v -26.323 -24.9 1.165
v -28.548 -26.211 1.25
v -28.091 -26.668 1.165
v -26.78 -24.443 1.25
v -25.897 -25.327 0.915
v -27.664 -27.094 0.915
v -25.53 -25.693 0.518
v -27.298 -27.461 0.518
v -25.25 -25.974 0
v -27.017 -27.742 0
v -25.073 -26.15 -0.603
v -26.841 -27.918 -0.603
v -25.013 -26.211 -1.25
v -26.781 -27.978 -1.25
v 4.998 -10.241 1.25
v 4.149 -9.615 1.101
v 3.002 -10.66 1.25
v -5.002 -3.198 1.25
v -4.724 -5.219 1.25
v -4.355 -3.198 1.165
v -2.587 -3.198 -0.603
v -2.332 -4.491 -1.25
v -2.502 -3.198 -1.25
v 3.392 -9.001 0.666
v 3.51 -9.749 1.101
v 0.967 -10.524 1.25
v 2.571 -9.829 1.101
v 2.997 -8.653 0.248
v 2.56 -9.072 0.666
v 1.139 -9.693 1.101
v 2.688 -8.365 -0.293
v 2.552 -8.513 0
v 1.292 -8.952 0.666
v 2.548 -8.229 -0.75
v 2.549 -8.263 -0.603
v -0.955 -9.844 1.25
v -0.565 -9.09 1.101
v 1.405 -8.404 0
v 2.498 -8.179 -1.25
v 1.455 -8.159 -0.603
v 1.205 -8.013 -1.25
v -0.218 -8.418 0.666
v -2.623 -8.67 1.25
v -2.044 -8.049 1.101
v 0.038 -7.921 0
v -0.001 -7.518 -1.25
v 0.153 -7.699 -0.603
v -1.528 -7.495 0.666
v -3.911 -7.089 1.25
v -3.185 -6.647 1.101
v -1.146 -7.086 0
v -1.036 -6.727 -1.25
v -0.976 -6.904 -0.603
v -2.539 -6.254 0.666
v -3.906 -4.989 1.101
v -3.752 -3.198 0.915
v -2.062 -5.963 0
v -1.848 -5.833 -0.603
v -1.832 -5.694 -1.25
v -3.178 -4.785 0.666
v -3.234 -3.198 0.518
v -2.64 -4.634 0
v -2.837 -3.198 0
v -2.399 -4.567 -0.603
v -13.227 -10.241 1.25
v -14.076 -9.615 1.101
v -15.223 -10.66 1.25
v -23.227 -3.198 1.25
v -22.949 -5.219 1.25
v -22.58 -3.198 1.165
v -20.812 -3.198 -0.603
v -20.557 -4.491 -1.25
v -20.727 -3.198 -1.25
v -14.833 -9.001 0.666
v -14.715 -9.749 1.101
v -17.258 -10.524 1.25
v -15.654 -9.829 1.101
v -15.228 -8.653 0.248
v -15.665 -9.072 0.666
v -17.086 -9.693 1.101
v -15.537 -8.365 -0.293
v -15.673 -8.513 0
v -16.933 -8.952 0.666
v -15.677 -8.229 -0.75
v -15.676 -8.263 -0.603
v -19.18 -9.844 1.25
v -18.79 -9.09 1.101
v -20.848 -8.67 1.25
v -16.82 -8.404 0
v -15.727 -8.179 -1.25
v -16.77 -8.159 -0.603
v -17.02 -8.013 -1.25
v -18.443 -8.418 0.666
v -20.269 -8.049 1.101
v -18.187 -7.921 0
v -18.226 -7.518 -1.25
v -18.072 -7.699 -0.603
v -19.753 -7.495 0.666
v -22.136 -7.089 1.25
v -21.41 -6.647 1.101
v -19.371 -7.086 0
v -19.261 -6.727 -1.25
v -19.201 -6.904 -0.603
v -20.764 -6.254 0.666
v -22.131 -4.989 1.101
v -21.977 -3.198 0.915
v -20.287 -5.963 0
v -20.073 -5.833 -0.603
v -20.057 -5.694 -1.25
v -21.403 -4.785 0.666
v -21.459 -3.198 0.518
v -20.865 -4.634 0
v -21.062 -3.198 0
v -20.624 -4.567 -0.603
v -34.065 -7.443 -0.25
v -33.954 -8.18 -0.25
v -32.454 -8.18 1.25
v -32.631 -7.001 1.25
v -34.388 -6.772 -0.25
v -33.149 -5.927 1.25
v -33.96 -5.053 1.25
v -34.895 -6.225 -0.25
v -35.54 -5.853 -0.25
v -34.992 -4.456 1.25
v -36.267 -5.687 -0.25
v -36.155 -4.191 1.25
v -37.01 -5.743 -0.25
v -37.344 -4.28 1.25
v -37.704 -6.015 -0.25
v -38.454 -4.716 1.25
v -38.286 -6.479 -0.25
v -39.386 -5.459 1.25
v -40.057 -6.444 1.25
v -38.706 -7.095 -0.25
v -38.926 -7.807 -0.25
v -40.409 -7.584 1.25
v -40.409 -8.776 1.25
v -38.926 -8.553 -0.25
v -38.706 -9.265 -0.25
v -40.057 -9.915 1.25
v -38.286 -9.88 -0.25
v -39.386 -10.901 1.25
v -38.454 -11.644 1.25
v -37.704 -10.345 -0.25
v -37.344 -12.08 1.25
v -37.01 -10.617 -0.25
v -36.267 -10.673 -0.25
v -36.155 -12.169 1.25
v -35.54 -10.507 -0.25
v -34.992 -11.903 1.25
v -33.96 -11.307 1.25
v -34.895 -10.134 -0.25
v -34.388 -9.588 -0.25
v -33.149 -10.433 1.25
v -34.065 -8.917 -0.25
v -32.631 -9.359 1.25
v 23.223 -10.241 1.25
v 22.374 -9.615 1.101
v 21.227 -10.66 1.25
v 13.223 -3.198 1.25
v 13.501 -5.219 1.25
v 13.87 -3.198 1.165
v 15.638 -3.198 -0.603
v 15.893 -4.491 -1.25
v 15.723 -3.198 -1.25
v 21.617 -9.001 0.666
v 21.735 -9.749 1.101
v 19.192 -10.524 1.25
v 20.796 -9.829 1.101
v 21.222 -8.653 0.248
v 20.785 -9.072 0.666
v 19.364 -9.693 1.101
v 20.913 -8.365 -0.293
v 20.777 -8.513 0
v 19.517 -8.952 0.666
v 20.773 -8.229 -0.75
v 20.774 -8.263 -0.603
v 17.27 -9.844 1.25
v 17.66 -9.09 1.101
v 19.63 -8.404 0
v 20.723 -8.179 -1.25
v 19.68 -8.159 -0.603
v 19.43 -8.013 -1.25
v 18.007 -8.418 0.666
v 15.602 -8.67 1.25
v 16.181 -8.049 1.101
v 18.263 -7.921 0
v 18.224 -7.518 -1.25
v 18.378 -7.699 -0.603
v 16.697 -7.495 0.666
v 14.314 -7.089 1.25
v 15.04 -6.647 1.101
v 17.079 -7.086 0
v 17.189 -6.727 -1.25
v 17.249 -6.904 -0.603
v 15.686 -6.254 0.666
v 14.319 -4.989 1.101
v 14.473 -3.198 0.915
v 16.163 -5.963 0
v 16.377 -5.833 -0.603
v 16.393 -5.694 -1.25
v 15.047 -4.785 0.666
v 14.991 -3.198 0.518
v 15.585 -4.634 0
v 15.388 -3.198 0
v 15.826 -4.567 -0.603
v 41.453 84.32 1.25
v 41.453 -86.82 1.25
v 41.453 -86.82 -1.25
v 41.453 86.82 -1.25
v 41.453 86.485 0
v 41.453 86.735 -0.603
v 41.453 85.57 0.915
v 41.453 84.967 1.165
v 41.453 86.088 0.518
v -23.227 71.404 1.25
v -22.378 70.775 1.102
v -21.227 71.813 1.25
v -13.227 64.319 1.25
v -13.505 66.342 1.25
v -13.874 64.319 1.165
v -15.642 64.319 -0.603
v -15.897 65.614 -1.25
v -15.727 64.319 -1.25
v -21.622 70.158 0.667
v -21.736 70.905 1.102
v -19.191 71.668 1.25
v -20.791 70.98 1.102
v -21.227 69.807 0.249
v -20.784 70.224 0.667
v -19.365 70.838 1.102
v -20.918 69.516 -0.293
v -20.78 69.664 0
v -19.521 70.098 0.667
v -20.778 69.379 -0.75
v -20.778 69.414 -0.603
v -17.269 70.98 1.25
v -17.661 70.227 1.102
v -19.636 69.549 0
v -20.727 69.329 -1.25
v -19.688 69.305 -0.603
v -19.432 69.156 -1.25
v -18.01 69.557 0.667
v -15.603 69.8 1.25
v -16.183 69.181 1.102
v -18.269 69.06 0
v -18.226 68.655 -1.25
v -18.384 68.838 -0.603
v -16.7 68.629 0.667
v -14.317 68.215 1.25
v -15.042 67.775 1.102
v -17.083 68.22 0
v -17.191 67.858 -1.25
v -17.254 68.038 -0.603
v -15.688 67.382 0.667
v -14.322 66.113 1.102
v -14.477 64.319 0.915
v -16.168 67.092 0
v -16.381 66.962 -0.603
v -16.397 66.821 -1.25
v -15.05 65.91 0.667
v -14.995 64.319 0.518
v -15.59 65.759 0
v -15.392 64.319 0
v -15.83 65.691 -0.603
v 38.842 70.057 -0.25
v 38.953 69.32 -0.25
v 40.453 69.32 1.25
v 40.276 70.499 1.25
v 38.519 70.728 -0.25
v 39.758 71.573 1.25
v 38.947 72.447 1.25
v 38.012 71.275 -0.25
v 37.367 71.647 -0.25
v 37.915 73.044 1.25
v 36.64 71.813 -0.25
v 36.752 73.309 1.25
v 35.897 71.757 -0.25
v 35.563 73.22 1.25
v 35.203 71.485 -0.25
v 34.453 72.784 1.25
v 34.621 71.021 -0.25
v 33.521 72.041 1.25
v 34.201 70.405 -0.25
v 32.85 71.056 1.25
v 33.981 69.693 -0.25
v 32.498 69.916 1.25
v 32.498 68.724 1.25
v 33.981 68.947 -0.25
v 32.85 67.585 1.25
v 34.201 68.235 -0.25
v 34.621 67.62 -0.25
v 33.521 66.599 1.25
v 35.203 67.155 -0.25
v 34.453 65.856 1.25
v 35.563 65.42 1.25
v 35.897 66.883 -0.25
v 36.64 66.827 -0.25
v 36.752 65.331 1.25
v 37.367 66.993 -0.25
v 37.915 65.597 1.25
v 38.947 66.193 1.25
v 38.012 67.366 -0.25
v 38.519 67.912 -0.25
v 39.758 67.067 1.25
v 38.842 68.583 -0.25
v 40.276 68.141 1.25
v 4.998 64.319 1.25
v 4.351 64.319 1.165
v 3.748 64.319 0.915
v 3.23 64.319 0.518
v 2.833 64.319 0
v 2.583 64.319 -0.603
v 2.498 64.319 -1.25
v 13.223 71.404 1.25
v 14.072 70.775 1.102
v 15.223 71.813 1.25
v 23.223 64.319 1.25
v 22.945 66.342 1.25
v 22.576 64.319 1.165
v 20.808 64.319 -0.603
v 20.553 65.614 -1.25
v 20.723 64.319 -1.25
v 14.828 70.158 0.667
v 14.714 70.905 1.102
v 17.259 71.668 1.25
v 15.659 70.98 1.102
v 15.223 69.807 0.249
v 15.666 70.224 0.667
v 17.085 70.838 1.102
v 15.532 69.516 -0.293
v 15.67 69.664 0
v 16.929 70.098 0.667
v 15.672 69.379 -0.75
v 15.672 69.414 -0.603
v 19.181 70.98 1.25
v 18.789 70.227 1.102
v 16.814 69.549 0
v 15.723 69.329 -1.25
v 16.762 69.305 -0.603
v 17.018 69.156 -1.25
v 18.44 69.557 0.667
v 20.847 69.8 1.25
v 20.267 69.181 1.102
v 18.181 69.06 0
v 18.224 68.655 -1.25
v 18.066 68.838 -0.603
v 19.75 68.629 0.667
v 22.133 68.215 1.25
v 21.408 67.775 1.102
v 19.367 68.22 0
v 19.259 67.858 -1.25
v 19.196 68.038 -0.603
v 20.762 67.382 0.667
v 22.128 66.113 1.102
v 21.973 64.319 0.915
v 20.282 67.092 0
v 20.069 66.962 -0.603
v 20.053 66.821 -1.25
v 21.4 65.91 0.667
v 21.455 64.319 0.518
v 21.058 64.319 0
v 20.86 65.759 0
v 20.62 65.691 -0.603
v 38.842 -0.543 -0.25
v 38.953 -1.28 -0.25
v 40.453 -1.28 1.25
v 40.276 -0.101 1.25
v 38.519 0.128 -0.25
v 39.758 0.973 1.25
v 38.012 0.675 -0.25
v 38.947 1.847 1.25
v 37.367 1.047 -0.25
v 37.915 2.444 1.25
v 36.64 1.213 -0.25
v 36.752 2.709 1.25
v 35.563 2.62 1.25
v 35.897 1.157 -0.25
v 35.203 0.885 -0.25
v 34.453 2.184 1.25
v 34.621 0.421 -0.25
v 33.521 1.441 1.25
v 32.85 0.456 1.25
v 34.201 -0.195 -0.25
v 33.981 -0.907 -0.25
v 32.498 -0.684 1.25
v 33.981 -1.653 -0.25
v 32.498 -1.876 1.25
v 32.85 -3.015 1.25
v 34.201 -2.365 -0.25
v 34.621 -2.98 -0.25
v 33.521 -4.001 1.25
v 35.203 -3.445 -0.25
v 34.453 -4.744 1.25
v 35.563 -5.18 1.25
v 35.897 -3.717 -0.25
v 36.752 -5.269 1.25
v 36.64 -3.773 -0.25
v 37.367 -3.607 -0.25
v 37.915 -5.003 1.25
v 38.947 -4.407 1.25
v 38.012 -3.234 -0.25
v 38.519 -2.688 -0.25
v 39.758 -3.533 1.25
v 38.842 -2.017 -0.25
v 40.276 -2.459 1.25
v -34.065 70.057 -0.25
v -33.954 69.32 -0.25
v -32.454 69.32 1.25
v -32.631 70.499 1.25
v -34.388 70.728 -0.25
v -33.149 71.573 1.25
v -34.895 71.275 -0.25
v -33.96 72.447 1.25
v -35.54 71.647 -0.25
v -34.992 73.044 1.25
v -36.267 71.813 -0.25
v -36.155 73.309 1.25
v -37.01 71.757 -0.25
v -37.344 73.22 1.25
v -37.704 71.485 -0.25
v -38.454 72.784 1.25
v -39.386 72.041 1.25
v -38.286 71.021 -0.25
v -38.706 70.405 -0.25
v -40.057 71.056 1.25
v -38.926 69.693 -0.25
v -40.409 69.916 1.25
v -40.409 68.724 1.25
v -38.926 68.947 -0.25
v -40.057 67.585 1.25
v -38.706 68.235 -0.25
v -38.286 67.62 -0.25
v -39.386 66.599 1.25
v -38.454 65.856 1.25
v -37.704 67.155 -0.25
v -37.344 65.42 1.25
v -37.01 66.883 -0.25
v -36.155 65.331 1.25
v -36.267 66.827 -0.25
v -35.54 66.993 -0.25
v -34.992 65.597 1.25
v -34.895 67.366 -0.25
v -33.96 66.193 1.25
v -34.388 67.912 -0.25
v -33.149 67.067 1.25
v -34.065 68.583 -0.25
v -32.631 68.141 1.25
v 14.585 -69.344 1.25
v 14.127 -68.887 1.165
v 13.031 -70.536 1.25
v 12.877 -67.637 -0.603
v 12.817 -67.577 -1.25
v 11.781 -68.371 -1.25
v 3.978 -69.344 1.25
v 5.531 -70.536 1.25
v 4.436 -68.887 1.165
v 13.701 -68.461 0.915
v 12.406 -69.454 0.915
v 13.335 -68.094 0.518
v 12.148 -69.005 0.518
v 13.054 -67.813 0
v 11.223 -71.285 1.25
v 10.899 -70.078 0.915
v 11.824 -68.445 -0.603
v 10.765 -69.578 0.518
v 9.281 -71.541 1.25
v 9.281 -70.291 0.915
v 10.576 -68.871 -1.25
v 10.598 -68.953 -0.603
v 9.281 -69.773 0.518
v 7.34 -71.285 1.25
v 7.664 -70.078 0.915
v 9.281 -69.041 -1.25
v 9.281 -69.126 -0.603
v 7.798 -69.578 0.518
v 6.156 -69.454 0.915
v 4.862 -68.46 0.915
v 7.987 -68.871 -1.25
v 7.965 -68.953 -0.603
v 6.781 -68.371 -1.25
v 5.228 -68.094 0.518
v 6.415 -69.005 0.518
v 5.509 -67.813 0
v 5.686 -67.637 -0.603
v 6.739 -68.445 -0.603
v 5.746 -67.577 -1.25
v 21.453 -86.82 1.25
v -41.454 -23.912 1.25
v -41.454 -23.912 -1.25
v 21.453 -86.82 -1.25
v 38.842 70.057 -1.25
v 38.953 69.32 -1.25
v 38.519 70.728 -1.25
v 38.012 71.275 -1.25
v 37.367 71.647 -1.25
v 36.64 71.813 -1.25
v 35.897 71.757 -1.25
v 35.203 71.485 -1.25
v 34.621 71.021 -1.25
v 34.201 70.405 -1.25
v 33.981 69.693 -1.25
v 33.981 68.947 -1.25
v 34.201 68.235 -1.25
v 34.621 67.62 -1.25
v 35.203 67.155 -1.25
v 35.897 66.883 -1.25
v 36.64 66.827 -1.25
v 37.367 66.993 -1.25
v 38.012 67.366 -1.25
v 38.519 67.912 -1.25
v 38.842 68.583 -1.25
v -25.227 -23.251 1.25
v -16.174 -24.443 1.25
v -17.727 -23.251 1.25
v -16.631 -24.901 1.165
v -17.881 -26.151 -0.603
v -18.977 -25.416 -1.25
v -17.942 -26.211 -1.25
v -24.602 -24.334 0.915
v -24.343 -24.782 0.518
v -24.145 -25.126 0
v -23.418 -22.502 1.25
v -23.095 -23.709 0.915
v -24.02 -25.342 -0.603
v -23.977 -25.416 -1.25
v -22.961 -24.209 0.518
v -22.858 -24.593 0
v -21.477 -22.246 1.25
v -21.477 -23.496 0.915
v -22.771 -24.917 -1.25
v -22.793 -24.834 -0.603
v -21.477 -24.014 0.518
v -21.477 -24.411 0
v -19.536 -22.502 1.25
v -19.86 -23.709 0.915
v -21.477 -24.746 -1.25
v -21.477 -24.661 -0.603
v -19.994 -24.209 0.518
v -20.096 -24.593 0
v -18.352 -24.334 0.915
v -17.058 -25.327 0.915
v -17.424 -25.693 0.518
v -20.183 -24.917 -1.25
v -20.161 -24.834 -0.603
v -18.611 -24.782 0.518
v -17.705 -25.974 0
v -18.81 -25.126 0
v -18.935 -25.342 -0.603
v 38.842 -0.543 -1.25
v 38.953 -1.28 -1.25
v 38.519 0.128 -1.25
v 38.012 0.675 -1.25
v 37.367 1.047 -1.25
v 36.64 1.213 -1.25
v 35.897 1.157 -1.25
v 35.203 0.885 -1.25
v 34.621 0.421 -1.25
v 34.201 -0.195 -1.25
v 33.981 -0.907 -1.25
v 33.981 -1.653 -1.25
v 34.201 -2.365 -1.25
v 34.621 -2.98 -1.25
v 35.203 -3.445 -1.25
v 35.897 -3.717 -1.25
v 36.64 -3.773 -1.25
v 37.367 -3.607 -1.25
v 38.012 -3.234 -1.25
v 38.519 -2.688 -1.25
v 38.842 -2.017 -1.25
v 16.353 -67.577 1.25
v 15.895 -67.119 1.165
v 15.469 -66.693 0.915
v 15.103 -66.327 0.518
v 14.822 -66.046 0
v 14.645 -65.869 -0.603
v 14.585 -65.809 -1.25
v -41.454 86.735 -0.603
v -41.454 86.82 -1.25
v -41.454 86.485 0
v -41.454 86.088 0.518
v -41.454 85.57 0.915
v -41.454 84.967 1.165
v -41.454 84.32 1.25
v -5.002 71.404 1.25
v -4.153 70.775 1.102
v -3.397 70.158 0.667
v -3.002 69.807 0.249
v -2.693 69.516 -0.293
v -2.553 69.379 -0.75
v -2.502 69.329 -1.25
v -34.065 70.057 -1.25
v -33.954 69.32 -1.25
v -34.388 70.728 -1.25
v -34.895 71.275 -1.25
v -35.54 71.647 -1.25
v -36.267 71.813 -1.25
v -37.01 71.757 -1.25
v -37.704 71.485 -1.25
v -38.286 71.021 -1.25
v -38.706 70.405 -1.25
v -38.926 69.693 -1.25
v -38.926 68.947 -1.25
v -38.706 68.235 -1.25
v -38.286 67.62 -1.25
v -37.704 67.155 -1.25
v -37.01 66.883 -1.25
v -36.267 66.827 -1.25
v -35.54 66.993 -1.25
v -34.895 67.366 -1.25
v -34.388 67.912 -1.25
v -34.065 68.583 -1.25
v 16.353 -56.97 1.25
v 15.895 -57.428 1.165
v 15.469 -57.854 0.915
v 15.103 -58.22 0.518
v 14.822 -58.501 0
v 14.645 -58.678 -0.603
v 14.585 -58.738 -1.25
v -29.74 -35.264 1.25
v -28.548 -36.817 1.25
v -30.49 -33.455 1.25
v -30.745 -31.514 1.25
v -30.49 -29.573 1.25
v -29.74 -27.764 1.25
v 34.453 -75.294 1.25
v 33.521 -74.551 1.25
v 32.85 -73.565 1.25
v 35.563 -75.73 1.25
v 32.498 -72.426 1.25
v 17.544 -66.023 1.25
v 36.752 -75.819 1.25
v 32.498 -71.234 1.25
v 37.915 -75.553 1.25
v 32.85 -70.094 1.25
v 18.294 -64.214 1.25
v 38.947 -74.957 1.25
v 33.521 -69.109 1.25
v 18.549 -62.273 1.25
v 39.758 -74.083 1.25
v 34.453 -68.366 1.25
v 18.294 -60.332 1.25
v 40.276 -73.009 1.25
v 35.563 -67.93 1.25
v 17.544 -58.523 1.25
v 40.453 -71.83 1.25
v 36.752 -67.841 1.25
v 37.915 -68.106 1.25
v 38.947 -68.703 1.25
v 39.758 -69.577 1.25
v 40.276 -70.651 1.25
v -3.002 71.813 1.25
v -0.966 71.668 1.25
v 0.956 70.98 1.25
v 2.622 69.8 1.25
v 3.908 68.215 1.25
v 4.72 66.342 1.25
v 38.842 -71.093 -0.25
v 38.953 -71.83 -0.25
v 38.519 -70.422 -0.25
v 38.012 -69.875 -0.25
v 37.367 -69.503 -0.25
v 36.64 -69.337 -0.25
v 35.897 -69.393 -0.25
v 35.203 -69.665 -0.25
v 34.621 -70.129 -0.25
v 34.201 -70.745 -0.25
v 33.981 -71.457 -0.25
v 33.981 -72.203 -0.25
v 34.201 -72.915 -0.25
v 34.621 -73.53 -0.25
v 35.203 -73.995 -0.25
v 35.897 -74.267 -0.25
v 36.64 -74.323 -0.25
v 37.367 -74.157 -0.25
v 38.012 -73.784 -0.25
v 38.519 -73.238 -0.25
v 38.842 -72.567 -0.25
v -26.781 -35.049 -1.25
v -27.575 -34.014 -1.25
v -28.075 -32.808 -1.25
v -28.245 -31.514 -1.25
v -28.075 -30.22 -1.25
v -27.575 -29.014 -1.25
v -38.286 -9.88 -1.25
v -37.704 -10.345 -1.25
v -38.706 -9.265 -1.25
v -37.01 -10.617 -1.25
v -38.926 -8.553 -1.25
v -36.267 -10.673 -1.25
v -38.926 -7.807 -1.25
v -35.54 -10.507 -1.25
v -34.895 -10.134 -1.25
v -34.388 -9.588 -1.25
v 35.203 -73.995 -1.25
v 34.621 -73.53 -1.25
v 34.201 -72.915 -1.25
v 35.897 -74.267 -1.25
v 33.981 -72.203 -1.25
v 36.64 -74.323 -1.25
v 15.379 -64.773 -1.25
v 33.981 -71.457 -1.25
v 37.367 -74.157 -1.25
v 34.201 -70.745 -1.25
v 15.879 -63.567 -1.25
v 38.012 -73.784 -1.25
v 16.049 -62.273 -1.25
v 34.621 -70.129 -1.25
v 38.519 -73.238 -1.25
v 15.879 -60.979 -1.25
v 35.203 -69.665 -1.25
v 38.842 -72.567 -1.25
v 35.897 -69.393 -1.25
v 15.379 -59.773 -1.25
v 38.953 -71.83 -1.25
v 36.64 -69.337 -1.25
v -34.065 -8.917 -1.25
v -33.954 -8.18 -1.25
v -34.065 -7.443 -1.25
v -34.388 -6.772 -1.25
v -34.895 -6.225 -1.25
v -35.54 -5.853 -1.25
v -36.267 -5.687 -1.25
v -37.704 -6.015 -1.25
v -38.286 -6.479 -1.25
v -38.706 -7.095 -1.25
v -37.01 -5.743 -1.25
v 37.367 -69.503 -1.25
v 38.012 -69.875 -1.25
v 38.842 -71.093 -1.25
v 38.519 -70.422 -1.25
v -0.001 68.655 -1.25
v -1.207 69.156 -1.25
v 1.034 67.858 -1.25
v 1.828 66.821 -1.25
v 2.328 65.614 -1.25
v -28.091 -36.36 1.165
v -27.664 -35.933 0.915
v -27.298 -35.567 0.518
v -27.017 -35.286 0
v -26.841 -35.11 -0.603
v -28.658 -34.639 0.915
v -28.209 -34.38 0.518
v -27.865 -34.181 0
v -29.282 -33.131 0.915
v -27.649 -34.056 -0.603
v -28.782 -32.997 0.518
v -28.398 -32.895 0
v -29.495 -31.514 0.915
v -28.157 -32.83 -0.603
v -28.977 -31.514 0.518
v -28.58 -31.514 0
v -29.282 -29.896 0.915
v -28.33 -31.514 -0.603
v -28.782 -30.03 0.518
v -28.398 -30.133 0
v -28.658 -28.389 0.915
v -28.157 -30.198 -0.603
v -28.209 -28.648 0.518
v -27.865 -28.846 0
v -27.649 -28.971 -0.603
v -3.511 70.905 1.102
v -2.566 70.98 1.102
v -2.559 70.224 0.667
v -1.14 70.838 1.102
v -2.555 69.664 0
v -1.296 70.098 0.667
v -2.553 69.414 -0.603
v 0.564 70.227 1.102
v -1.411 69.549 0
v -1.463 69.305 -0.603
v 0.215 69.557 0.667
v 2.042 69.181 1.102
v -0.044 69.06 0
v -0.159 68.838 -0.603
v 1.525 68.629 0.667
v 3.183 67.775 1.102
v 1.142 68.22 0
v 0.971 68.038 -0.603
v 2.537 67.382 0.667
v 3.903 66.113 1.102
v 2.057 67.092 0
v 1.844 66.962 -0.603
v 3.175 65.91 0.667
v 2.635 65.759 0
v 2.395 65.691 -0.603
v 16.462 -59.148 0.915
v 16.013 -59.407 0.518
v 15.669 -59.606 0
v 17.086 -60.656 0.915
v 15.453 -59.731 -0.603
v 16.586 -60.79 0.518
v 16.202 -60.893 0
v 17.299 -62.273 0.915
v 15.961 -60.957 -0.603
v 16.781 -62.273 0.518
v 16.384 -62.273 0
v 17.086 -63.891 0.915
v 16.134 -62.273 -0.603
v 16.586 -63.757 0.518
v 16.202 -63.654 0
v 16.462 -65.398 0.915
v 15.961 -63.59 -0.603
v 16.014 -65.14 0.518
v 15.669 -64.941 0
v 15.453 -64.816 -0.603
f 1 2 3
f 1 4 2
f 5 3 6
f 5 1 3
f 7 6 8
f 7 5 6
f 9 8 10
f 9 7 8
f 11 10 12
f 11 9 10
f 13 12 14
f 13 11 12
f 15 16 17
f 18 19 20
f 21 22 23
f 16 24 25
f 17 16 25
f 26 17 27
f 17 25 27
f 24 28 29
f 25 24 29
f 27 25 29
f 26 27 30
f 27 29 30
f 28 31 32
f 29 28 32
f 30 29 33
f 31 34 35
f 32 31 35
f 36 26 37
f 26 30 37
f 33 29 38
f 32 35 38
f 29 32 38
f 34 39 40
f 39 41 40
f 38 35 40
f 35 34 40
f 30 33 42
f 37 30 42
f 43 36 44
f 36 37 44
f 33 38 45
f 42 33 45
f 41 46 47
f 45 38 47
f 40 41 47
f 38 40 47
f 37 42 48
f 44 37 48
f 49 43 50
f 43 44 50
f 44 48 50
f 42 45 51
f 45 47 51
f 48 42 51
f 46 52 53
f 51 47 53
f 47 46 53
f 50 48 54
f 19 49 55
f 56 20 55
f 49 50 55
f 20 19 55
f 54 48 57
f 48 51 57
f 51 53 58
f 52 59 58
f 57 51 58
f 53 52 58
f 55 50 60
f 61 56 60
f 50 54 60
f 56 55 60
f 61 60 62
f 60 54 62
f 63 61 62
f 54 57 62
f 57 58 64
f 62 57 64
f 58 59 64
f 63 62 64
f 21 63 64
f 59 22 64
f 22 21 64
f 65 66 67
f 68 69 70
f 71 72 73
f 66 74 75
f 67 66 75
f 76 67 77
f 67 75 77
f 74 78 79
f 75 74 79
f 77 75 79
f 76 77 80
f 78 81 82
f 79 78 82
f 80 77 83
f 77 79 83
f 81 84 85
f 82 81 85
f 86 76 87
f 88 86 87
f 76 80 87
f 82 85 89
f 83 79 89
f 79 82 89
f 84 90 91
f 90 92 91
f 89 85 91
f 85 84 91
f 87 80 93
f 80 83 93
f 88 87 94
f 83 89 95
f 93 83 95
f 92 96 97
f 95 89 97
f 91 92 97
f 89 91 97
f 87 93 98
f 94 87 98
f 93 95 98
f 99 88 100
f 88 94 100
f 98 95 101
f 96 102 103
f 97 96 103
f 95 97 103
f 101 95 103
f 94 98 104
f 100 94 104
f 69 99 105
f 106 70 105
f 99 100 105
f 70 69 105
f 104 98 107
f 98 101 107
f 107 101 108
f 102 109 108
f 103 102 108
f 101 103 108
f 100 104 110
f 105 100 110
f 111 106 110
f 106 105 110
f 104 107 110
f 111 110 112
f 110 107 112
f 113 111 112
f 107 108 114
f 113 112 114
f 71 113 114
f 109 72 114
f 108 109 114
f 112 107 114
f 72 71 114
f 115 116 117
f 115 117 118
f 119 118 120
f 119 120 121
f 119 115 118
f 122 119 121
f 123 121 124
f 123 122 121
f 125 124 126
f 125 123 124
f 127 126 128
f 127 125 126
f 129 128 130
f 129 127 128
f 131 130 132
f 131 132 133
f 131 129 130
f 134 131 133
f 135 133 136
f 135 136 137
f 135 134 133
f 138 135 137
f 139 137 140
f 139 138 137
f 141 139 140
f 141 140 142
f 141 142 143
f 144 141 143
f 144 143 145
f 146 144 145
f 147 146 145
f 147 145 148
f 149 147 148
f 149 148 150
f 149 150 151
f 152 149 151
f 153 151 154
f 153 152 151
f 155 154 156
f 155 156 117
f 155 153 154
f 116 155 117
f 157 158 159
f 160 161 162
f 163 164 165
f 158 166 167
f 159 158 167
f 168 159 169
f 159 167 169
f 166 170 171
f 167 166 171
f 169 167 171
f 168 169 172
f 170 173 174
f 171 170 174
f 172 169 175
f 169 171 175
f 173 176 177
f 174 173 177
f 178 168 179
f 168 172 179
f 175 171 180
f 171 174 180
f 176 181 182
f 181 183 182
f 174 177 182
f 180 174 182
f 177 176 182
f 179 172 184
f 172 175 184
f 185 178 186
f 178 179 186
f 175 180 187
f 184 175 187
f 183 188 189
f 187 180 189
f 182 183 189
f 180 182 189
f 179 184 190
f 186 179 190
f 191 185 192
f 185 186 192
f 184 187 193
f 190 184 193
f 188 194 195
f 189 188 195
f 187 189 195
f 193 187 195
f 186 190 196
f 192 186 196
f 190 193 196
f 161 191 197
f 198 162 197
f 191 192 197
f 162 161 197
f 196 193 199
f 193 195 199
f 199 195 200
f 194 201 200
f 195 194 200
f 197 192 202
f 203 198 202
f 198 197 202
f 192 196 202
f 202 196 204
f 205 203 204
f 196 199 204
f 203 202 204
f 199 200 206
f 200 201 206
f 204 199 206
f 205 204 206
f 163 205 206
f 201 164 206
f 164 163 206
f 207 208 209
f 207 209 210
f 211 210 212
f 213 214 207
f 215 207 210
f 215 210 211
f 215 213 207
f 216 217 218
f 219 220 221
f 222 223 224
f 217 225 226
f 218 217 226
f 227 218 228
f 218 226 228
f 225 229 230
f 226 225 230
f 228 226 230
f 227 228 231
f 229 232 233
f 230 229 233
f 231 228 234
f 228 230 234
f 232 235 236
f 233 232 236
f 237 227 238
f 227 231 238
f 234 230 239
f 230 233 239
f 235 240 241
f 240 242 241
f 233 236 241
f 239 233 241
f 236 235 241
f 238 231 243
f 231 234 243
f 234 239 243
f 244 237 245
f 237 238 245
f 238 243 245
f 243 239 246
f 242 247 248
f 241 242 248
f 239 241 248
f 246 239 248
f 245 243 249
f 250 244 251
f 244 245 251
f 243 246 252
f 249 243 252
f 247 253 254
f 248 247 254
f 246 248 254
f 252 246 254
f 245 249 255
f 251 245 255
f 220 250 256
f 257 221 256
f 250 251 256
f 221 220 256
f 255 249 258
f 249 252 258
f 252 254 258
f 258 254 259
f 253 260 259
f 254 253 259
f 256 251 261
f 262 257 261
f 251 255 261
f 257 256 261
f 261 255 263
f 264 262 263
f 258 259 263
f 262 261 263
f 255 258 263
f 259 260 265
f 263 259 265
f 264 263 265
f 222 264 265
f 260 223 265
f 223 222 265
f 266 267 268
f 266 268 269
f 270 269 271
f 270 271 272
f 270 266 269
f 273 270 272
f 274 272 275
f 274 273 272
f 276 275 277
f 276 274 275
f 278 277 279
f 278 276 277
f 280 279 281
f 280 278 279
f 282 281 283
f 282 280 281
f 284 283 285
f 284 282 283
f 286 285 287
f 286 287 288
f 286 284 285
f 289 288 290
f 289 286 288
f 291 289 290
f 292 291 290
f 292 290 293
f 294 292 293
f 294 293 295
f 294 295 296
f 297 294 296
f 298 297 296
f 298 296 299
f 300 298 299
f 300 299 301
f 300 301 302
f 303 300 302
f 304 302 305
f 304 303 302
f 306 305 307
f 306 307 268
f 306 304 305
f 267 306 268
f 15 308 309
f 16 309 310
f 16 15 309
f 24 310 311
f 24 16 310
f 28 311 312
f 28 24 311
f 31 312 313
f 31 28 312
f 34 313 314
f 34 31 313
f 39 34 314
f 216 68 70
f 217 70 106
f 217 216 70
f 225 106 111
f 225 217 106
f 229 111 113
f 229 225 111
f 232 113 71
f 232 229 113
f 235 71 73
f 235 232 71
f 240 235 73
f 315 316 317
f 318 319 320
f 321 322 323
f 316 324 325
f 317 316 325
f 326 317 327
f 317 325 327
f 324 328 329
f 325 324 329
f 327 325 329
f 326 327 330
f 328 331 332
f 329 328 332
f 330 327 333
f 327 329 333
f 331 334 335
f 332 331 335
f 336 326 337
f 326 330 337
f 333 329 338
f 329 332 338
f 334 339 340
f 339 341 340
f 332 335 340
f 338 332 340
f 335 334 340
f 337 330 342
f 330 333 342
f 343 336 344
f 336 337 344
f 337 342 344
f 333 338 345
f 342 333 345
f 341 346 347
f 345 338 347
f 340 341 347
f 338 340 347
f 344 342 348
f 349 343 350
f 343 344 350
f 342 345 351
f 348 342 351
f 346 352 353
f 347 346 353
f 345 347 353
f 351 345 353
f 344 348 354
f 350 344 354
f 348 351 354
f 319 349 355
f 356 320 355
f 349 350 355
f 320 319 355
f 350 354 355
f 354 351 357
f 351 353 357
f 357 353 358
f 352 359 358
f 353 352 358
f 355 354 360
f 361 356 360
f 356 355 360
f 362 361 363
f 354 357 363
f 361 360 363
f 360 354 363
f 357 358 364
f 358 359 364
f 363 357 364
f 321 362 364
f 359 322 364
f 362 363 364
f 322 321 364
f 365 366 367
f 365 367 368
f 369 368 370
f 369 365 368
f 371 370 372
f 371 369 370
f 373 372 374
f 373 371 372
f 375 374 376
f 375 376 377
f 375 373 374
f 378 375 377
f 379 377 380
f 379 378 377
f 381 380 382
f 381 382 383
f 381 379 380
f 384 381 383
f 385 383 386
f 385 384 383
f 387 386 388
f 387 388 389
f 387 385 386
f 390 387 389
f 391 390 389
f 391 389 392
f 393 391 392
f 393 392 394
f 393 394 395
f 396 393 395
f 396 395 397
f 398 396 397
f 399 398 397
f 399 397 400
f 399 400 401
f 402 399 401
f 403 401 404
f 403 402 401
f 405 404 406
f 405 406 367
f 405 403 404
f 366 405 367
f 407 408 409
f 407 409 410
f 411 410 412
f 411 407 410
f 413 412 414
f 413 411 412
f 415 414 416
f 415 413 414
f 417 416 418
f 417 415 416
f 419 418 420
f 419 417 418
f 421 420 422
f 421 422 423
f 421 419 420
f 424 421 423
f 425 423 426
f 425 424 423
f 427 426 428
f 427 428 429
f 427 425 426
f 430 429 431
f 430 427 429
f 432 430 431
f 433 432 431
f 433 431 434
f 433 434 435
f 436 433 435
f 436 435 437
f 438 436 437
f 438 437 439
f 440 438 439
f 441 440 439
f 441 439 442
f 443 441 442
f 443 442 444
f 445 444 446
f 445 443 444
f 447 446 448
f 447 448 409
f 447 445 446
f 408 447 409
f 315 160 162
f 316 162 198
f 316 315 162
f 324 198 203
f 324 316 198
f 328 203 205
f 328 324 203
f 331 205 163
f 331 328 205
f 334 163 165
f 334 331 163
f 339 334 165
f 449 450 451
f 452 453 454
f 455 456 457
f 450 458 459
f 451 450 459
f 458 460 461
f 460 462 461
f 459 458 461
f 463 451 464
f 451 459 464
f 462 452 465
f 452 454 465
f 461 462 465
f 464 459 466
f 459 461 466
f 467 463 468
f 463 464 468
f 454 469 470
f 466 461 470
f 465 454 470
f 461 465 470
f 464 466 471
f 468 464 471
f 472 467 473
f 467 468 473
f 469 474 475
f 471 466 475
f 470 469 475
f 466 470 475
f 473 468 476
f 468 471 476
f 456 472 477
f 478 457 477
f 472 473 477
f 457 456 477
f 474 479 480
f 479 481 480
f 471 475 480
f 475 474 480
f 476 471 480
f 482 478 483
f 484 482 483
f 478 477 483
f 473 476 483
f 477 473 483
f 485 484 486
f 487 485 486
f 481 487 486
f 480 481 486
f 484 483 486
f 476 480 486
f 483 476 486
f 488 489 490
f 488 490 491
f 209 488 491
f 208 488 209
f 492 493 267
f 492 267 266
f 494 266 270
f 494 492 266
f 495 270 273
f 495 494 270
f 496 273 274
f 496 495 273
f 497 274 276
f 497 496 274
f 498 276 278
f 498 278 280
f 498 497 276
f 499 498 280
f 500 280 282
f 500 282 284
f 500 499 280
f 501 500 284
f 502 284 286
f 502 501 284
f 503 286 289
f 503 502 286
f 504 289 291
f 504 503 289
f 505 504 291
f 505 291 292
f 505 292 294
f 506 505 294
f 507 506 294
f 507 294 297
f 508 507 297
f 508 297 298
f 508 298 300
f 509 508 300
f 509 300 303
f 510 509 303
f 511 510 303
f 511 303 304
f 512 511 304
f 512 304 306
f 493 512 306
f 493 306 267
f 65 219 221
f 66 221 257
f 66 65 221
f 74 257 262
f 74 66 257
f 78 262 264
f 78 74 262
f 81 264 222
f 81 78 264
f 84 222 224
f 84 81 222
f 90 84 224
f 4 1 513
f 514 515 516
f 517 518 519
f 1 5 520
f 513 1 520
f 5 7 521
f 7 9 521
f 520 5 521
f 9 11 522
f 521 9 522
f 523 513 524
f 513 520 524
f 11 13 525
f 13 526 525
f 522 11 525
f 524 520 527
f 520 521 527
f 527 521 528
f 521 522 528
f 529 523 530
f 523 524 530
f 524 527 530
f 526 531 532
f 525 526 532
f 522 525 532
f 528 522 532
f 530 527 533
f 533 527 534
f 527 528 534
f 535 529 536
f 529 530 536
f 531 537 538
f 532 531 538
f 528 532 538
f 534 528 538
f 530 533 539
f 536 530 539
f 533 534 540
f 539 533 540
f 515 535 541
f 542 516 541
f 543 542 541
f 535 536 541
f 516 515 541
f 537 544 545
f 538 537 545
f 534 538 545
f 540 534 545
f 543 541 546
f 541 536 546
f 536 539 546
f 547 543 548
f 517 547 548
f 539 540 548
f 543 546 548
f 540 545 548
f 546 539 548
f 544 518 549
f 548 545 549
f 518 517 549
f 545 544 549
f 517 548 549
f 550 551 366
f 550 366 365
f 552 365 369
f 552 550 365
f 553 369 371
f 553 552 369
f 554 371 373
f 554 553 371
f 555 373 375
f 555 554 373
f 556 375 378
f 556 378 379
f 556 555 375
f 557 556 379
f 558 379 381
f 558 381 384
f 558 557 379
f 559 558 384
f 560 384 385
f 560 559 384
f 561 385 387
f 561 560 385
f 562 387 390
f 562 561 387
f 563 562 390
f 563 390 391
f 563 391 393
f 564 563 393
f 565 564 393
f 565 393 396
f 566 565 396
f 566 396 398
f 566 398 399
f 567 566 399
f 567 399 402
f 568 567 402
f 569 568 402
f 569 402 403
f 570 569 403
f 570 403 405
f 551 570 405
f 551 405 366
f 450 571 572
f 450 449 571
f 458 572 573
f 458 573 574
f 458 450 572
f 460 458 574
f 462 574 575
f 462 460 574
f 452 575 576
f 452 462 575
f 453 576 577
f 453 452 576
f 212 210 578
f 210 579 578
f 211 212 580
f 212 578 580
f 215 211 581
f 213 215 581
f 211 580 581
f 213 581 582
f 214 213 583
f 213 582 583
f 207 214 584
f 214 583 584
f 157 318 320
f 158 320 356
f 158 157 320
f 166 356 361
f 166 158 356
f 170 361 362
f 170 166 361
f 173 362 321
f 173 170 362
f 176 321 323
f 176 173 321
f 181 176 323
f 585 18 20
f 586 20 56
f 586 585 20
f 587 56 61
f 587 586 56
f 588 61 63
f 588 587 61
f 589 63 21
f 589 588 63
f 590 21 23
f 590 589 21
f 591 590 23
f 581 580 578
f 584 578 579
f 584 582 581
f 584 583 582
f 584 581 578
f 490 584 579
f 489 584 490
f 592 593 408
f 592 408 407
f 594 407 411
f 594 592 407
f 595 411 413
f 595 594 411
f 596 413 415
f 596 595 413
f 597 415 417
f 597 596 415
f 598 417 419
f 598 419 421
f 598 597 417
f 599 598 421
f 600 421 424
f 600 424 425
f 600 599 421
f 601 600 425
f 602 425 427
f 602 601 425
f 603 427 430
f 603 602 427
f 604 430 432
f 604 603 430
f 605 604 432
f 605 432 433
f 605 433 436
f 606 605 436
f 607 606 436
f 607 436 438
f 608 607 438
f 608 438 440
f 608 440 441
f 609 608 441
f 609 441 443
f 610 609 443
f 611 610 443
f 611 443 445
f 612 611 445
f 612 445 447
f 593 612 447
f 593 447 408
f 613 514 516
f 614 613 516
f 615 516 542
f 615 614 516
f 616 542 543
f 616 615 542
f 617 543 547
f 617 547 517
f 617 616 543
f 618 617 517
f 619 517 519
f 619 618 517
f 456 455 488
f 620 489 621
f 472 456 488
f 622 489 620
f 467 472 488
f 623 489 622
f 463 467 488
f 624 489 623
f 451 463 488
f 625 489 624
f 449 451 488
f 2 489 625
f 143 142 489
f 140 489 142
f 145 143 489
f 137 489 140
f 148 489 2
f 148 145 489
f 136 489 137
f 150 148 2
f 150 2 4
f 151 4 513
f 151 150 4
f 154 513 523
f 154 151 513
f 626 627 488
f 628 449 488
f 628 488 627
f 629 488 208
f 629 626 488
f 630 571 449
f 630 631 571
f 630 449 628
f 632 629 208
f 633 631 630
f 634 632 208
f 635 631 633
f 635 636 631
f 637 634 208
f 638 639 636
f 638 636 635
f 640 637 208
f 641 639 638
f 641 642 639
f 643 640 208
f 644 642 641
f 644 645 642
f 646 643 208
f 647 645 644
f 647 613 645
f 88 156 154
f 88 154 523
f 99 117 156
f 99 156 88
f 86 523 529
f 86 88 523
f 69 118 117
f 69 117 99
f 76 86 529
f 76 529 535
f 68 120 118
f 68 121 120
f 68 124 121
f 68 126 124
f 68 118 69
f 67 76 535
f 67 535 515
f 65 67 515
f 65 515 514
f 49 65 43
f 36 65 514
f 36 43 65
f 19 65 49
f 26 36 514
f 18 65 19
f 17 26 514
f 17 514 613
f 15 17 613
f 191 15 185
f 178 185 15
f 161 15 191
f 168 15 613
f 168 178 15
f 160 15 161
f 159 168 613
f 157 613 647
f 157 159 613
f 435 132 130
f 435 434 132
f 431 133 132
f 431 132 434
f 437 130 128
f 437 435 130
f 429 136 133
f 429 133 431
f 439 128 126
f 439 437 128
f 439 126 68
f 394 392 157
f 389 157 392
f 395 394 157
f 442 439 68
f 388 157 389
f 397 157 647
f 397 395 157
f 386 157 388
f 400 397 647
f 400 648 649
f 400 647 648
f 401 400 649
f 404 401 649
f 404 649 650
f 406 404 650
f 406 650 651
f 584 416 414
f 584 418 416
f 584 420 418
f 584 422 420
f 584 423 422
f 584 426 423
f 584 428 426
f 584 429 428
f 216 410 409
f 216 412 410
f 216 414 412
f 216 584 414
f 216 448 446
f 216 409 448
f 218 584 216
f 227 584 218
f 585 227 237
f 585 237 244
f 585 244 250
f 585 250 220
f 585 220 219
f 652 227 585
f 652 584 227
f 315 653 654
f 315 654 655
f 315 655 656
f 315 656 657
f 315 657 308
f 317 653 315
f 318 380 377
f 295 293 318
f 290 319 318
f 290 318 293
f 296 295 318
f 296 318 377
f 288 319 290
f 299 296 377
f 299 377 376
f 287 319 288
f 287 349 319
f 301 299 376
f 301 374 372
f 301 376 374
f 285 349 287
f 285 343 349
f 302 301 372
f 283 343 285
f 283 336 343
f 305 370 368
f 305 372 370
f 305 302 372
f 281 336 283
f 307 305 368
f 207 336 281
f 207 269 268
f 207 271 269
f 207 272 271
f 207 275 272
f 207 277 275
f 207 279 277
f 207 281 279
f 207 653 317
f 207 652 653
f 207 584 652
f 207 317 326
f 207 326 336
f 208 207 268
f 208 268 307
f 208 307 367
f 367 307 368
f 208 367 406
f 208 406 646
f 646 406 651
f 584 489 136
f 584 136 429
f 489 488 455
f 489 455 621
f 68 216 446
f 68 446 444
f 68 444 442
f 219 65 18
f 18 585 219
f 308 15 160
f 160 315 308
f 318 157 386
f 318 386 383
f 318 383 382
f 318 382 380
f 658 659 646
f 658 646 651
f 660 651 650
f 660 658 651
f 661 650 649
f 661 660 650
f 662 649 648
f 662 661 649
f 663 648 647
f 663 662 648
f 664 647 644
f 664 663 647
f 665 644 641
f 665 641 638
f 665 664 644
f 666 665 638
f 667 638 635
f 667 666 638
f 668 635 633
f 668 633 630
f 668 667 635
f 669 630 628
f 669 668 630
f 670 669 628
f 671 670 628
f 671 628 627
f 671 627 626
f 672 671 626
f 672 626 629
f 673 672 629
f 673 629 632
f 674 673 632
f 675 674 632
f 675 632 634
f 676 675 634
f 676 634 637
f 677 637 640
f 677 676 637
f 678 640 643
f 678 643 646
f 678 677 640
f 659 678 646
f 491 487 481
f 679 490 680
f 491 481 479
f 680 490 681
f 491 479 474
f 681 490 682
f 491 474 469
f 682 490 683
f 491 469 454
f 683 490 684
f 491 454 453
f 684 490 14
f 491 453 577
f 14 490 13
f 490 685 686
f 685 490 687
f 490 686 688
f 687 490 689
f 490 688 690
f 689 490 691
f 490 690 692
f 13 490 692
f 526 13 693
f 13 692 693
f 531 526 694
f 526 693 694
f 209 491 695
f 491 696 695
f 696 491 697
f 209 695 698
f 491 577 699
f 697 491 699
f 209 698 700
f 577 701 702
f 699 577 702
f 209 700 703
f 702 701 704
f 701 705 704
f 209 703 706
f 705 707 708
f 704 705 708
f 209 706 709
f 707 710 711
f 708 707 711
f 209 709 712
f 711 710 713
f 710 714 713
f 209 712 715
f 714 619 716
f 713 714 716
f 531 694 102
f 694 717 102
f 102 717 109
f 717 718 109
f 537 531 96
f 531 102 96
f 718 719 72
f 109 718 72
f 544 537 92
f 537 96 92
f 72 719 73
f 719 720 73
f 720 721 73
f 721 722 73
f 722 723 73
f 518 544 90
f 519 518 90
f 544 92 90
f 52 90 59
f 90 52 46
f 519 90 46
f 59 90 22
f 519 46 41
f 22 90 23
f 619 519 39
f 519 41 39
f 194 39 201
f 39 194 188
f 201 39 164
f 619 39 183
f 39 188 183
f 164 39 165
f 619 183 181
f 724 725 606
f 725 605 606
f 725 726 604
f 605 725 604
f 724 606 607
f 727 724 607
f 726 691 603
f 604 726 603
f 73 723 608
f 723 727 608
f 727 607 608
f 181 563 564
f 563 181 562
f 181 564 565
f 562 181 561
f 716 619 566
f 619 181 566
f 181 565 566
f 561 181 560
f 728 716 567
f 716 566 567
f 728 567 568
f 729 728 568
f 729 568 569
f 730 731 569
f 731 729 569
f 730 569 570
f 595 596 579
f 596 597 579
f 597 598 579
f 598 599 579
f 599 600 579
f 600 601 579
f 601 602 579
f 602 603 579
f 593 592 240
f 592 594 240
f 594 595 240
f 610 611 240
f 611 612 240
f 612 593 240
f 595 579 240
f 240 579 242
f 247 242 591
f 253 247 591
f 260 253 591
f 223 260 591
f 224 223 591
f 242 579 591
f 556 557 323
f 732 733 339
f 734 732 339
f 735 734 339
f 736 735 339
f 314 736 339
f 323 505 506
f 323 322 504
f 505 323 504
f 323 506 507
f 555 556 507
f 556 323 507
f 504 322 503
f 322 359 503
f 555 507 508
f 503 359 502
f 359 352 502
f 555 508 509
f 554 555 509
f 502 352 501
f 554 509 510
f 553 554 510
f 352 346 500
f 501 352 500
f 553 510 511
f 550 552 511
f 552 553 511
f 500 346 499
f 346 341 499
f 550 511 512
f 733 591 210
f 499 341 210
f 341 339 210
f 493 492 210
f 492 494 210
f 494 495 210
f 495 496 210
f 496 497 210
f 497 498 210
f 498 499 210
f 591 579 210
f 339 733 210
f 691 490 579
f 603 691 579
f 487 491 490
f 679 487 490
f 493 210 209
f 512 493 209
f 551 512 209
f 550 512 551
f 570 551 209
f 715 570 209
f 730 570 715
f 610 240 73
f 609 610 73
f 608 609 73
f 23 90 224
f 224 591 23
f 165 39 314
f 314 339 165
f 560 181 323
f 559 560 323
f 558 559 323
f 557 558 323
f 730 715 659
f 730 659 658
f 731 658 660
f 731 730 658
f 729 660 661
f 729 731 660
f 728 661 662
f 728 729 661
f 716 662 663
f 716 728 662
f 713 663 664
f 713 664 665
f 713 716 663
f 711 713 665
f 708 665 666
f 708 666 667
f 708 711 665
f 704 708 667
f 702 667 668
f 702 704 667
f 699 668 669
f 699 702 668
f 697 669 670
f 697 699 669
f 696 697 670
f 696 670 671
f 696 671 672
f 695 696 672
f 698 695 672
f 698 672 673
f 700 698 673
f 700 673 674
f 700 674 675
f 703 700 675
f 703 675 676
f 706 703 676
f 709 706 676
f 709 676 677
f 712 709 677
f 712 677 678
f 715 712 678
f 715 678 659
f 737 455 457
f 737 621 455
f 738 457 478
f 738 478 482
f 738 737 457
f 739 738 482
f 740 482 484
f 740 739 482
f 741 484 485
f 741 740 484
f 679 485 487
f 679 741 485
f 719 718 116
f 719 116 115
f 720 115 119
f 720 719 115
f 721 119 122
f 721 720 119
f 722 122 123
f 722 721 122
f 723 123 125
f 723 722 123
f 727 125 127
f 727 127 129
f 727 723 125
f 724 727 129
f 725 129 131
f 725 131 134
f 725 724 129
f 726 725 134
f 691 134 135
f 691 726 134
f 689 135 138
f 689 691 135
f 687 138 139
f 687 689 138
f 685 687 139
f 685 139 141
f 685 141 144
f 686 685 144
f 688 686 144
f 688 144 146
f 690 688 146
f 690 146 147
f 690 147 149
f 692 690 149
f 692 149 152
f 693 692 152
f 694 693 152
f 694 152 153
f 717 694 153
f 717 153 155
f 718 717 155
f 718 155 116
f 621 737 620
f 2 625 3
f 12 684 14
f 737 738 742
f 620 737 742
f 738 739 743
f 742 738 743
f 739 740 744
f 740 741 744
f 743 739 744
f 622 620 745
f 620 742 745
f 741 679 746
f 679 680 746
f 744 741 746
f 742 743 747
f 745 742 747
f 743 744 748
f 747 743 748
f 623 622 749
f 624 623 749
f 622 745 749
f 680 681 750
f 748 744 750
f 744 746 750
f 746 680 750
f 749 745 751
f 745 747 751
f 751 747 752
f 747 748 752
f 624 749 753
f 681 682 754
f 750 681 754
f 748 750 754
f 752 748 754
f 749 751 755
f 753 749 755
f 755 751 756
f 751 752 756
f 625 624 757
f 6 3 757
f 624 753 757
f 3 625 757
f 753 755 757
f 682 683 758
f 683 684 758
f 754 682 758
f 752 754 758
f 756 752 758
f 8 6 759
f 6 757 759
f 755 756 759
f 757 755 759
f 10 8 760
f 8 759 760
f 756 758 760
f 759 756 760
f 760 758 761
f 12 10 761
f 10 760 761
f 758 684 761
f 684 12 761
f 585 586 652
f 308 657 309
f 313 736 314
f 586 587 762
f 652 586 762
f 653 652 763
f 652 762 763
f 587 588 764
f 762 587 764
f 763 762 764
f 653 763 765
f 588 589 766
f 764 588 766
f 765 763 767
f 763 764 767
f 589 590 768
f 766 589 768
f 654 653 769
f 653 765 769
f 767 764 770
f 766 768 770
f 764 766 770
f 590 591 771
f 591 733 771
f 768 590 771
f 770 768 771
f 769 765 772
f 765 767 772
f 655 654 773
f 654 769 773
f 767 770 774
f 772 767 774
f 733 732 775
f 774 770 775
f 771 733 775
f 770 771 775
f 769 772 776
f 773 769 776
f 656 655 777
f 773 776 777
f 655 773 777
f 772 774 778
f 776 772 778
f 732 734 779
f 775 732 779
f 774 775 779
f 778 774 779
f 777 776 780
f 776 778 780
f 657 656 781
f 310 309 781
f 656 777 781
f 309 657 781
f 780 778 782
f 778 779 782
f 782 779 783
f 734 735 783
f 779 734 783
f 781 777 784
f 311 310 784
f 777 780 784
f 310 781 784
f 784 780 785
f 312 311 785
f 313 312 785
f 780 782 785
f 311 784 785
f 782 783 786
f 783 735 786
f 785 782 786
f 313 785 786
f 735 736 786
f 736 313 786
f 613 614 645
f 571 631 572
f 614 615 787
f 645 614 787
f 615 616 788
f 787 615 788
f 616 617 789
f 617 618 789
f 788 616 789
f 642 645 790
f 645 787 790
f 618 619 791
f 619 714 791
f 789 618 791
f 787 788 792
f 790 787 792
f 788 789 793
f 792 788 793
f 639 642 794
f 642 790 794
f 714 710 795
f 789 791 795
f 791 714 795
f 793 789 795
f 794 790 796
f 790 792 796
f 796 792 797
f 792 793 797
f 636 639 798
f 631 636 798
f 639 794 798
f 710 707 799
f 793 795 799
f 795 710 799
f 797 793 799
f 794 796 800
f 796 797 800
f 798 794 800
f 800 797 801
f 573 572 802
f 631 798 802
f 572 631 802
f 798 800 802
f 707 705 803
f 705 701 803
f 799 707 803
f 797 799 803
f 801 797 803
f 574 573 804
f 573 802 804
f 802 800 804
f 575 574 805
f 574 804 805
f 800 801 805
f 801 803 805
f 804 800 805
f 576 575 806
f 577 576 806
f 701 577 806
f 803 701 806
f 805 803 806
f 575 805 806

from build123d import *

# Parameters (mm, degrees)
F0_R     = 2.5
F1_DEPTH = 1.25
F2_R     = 2.49999
F3_SIZE  = 1.5


# Not quite as in the source:
# - a fillet or chamfer is up to 0.001 mm smaller than in the source, because OpenCascade refuses the exact size


with BuildPart() as f1:
    # F0 (on Top) → F1 (new body, symmetric)
    with BuildSketch(Plane.XY):
        Polygon((41.4534954924, 86.8201051839), (-41.4535404544, 86.8201051839), (-41.4535404544, -23.9118914119), (21.4531252731, -86.8199001066), (41.4534954924, -86.8199001066), align=None)
        with BuildLine():
            ThreePointArc((-25.0127278268, -26.2106563896), (-21.4771550521, -24.7462917212), (-17.9416265813, -26.210763353))
            Line((-17.9416265813, -26.210763353), (14.5847404845, -58.7378248101))
            ThreePointArc((14.5847404845, -58.7378248101), (16.0492105587, -62.2733815916), (14.5847972009, -65.8089618652))
            Line((14.5847972009, -65.8089618652), (12.816990028, -67.5766218932))
            ThreePointArc((12.816990028, -67.5766218932), (9.2814327639, -69.0409837172), (5.745914741, -67.5765271526))
            Line((5.745914741, -67.5765271526), (-26.7805685052, -35.0493495125))
            ThreePointArc((-26.7805685052, -35.0493495125), (-28.2451162288, -31.5138612573), (-26.7805848271, -27.9783662409))
            Line((-26.7805848271, -27.9783662409), (-25.0127278268, -26.2106563896))
        make_face(mode=Mode.SUBTRACT)
        with Locations((-36.4535404544, -8.1798948161)):
            Circle(F0_R, mode=Mode.SUBTRACT)
        with Locations((36.4534954924, -71.8298948161)):
            Circle(F0_R, mode=Mode.SUBTRACT)
        with Locations((36.4534954924, -1.2798948161)):
            Circle(F0_R, mode=Mode.SUBTRACT)
        with BuildLine():
            Line((-20.7271233506, -3.1984749304), (-20.7271233506, 69.3290029653))
            ThreePointArc((-20.7271233506, 69.3290029653), (-17.1909981799, 67.8582257506), (-15.7271233506, 64.3192375729))
            Line((-15.7271233506, 64.3192375729), (-15.7271233506, -8.1786223686))
            ThreePointArc((-15.7271233506, -8.1786223686), (-19.2614484064, -6.7269968768), (-20.7271233506, -3.1984749304))
        make_face(mode=Mode.SUBTRACT)
        with BuildLine():
            Line((-2.5021233506, -3.1984749304), (-2.5021233506, 69.3290029653))
            ThreePointArc((-2.5021233506, 69.3290029653), (1.0340018201, 67.8582257506), (2.4978766494, 64.3192375729))
            Line((2.4978766494, 64.3192375729), (2.4978766494, -8.1786223686))
            ThreePointArc((2.4978766494, -8.1786223686), (-1.0364484064, -6.7269968768), (-2.5021233506, -3.1984749304))
        make_face(mode=Mode.SUBTRACT)
        with Locations((-36.4535404544, 69.3201051839)):
            Circle(F0_R, mode=Mode.SUBTRACT)
        with BuildLine():
            Line((15.7228766494, -3.1984749304), (15.7228766494, 69.3290029653))
            ThreePointArc((15.7228766494, 69.3290029653), (19.2590018201, 67.8582257506), (20.7228766494, 64.3192375729))
            Line((20.7228766494, 64.3192375729), (20.7228766494, -8.1786223686))
            ThreePointArc((20.7228766494, -8.1786223686), (17.1885515936, -6.7269968768), (15.7228766494, -3.1984749304))
        make_face(mode=Mode.SUBTRACT)
        with Locations((36.4534954924, 69.3201051839)):
            Circle(F0_R, mode=Mode.SUBTRACT)
    extrude(amount=F1_DEPTH, both=True)

    # F2 (radius 2.5 in the source; OpenCascade refuses exactly that, so slightly less here)
    f2_edges = [f1.edges().sort_by_distance(p)[0] for p in [
        (-10.517327, -51.312938, 1.25),
        (-20.727123, 33.065264, 1.25),
        (-2.502123, 33.065264, 1.25),
        (15.722877, 33.065264, 1.25),
        (-17.190998, 67.858226, 1.25),
        (1.034002, 67.858226, 1.25),
        (19.259002, 67.858226, 1.25),
        (-2.2e-05, 86.820105, 1.25),
    ]]
    fillet(f2_edges, radius=F2_R)

    # F3
    f3_edges = [f1.edges().sort_by_distance(p)[0] for p in [
        (-38.95354, -8.179895, 1.25),
        (-38.95354, 69.320105, 1.25),
        (33.953495, 69.320105, 1.25),
        (33.953495, -1.279895, 1.25),
        (33.953495, -71.829895, 1.25),
    ]]
    chamfer(f3_edges, length=F3_SIZE)


solid = f1.part
